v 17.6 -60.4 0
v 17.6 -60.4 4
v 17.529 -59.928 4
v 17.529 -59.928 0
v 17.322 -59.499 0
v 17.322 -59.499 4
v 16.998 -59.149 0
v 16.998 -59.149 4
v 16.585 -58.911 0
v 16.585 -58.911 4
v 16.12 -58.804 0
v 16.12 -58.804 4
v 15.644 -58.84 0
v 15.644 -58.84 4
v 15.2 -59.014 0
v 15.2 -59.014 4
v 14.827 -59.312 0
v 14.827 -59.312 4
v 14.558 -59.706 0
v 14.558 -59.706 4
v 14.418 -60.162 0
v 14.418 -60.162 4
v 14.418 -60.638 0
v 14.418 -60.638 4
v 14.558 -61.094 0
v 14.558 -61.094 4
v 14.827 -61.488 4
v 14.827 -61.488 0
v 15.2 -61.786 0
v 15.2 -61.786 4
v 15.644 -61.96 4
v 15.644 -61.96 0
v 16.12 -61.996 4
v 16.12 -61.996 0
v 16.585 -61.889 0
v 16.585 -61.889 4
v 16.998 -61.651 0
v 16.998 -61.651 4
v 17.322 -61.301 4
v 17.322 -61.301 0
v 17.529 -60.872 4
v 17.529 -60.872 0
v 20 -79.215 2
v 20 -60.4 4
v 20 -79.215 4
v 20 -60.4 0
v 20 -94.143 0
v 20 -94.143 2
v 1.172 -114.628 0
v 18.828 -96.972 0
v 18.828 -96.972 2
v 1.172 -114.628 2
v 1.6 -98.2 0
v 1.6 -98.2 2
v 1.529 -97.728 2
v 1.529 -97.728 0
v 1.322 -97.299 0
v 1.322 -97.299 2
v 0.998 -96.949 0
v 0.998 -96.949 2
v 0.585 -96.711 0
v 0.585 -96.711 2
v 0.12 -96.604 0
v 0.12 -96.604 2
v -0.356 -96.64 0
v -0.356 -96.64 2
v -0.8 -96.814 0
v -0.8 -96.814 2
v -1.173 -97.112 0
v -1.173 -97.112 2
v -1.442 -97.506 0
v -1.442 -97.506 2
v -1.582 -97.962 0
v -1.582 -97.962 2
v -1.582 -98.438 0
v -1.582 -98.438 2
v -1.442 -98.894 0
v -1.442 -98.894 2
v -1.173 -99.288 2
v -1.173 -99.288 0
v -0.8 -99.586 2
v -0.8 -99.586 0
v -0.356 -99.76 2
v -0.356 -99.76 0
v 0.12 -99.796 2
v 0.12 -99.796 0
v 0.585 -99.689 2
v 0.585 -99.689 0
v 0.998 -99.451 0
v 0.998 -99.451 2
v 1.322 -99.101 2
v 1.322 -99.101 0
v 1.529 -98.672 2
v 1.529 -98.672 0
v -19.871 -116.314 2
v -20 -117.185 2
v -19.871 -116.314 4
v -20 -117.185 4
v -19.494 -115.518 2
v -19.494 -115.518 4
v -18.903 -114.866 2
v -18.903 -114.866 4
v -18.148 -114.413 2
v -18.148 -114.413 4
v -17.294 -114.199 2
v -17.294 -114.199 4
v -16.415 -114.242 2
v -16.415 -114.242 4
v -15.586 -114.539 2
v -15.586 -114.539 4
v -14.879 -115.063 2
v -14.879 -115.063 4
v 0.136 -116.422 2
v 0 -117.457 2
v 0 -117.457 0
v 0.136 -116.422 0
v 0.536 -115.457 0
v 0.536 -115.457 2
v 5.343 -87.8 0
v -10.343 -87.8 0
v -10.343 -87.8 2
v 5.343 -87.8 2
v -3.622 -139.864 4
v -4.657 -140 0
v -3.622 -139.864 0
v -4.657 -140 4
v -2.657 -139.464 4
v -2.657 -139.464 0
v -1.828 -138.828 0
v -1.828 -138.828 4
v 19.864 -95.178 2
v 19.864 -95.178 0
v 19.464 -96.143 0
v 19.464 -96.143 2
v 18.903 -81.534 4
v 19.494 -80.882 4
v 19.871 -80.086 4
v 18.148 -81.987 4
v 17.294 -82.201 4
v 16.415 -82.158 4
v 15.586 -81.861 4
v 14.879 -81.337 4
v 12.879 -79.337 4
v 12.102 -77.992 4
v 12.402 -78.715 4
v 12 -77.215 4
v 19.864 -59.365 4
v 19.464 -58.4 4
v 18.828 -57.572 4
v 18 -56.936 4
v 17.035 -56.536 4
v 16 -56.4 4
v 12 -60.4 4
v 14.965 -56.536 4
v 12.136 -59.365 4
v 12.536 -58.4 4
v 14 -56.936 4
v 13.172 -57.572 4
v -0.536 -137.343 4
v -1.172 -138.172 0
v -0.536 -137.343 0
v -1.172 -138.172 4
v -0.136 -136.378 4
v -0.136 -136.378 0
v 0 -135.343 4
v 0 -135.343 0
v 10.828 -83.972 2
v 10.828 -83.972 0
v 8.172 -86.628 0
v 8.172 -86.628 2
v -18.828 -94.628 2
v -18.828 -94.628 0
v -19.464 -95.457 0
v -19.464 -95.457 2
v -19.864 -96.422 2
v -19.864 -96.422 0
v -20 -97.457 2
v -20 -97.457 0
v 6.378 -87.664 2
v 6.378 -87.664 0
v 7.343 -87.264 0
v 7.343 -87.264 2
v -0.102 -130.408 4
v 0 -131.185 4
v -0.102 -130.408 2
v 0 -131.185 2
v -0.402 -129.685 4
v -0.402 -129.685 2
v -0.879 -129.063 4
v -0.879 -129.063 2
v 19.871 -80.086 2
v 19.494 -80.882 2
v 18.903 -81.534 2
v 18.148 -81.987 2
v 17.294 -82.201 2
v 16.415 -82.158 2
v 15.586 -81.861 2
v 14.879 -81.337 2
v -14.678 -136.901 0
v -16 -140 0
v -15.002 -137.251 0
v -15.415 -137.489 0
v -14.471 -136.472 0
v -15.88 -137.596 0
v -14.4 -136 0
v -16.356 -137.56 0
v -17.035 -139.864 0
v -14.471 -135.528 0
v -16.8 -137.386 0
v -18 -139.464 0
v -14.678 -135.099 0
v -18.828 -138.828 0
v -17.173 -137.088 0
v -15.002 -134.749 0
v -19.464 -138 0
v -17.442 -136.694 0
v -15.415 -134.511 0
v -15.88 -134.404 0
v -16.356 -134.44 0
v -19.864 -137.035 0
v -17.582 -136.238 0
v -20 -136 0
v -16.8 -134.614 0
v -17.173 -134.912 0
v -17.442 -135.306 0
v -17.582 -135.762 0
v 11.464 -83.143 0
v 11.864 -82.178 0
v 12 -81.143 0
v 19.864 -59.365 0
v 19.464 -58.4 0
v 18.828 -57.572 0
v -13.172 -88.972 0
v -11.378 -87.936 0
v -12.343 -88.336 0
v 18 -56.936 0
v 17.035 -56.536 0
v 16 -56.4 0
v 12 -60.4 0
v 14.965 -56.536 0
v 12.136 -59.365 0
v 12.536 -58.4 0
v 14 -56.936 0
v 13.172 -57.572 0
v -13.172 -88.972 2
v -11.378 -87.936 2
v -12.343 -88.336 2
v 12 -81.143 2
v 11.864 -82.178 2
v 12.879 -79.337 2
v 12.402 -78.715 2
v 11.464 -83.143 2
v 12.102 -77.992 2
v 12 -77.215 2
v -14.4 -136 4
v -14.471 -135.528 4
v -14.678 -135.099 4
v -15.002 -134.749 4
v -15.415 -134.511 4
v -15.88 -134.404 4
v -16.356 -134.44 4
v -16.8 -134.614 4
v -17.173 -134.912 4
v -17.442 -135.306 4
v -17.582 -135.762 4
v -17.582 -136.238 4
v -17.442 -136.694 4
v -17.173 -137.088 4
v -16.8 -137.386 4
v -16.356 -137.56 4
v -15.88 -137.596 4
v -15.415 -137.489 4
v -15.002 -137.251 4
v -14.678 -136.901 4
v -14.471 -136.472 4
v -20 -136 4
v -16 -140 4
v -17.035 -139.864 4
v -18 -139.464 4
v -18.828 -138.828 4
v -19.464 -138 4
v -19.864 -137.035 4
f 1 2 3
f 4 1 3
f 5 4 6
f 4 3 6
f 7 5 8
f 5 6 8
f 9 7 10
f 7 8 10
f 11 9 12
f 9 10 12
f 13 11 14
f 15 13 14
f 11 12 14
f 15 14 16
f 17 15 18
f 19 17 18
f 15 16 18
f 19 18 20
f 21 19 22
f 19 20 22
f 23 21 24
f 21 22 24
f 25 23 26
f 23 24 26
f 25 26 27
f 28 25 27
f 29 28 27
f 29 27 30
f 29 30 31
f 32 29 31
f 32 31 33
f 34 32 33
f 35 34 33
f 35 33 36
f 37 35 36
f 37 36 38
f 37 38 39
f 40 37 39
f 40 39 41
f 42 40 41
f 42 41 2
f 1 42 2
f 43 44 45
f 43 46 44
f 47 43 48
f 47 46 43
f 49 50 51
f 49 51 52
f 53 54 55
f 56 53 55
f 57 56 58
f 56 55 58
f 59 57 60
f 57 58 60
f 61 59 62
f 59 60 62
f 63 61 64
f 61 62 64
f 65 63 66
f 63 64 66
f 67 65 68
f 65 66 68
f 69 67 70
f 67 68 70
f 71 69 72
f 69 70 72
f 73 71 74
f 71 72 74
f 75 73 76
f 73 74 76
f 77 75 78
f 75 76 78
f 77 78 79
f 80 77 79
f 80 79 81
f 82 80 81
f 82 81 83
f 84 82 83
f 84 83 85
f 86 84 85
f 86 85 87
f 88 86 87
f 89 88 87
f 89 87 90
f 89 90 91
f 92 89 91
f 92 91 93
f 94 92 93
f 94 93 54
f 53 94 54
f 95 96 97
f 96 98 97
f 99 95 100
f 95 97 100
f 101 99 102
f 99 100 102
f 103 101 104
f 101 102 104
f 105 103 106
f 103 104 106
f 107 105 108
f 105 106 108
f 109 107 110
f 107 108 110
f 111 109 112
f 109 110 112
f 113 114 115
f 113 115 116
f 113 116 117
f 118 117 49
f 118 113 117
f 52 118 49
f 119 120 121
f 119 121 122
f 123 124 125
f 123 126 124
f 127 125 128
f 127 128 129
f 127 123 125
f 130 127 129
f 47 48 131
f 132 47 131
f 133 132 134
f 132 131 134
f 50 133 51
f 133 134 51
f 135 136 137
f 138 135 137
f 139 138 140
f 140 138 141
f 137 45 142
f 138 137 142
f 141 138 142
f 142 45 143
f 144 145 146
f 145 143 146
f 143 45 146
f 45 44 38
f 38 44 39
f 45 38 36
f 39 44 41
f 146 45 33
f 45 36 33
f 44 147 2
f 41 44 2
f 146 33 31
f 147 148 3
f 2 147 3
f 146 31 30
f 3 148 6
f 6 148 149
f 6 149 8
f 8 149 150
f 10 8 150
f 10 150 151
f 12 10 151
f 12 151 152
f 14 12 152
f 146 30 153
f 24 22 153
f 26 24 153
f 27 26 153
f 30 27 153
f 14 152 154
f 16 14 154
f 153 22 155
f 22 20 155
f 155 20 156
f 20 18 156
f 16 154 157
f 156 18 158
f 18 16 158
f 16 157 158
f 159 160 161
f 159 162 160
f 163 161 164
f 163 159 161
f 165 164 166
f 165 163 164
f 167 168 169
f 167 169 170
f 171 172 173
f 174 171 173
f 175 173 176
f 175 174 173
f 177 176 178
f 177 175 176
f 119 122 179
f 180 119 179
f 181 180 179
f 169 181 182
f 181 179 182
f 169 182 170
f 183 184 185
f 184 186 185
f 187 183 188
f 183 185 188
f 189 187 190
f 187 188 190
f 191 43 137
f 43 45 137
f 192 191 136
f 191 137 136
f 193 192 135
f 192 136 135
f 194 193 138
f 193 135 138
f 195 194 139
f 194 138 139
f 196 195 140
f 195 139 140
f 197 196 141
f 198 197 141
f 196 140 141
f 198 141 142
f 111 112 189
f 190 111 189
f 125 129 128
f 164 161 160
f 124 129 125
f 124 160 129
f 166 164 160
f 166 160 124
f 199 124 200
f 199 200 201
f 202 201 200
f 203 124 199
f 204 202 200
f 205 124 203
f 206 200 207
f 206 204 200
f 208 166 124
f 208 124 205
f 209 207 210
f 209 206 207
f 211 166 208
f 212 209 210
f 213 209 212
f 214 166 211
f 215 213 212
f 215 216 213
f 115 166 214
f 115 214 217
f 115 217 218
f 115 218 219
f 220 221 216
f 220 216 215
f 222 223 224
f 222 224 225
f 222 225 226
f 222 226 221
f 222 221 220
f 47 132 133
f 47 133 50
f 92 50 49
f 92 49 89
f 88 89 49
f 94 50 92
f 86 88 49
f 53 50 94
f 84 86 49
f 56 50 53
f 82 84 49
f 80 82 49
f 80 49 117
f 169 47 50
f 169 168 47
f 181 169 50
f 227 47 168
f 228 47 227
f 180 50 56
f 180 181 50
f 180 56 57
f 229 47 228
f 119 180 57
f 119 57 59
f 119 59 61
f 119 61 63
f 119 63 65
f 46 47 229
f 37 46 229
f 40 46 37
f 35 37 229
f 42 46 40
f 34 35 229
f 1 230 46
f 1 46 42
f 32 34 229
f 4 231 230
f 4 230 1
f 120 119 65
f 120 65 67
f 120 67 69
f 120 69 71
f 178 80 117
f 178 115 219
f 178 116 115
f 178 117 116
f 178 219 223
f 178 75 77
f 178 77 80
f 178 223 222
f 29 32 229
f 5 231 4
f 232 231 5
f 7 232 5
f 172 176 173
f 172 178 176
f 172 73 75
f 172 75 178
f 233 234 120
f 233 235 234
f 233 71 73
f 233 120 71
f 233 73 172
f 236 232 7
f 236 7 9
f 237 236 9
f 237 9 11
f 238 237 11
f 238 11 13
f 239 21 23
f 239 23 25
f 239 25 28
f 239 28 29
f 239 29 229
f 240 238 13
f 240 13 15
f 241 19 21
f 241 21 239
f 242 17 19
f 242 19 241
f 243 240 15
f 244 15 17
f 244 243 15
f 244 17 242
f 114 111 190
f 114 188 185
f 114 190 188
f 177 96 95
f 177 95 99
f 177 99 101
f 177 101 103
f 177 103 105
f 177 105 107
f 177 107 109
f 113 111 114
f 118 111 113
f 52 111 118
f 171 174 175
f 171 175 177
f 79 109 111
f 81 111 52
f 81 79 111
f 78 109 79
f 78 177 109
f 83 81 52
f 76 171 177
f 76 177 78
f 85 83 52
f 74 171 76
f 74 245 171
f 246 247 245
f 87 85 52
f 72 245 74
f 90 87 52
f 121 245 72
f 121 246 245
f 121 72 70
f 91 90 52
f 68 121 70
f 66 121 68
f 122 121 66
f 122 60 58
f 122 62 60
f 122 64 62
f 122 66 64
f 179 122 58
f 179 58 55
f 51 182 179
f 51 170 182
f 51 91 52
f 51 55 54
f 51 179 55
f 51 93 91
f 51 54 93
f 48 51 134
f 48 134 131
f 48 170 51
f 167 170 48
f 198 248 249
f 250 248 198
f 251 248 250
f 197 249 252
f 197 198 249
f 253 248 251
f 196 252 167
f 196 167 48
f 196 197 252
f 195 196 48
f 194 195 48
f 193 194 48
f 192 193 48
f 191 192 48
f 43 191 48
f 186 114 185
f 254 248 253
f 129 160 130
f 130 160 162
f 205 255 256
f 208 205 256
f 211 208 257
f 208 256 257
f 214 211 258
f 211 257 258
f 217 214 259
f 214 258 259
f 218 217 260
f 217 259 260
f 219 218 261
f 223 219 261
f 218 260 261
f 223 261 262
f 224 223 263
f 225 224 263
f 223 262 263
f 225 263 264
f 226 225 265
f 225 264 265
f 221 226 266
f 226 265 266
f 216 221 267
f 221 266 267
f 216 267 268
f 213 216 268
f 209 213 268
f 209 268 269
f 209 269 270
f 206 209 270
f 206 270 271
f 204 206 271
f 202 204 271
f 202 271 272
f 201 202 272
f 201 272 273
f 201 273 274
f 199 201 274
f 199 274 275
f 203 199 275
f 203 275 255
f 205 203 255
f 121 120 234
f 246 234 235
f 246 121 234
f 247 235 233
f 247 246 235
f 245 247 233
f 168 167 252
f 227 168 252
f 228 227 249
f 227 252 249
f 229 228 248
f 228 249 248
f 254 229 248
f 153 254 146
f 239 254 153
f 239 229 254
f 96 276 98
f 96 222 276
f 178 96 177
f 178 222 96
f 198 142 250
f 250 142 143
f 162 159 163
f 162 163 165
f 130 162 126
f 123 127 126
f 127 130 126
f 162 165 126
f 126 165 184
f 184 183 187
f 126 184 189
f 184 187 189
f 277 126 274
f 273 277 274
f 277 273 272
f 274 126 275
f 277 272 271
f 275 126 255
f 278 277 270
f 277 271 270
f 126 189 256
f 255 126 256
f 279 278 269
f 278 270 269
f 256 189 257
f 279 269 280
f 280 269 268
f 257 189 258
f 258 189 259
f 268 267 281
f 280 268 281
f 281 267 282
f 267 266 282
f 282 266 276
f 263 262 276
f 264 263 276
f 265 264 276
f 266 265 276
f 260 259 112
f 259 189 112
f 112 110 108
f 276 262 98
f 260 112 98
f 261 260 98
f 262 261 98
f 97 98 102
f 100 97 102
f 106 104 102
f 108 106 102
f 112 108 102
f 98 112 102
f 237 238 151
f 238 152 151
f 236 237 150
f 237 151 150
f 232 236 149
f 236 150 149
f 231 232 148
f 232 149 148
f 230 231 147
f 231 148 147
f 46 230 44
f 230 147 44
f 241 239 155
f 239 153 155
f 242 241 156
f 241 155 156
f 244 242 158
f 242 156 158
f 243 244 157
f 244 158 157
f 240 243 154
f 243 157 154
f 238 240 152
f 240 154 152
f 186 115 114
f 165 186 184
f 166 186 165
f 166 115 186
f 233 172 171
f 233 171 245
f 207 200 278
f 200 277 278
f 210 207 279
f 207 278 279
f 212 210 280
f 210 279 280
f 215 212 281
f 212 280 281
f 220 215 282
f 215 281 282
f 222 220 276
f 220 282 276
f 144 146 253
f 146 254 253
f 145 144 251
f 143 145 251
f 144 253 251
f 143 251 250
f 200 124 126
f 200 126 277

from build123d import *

# Parameters (mm, degrees)
BOSS_EXTRUDE1_DEPTH = 4
FILLET1_R           = 4
CHAMFER1_SIZE       = 3
CHAMFER2_SIZE       = 5
FILLET2_R           = 4
SKETCH2_R           = 1.6
CUT_EXTRUDE1_DEPTH  = 142.477913471
CUT_EXTRUDE2_DEPTH  = 2
FILLET3_R           = 3
SKETCH4_R           = 1.6
CUT_EXTRUDE3_DEPTH  = 142.477913471


with BuildPart() as part:
    # Sketch1 → Boss-Extrude1 (new body)
    with BuildSketch(Plane.XY):
        Polygon((-12, -87.8), (12, -87.8), (12, -56.4), (20, -56.4), (20, -95.8), (0, -115.8), (0, -140), (-20, -140), (-20, -95.8), align=None)
    extrude(amount=BOSS_EXTRUDE1_DEPTH)

    # Fillet1
    fillet1_edges = [part.edges().sort_by_distance(p)[0] for p in [
        (12, -56.4, 2),
        (20, -56.4, 2),
        (-20, -140, 2),
    ]]
    fillet(fillet1_edges, radius=FILLET1_R - 0.0001)  # a hair under: the kernel refuses the full size

    # Chamfer1
    chamfer1_edges = [part.edges().sort_by_distance(p)[0] for p in [
        (0, -140, 2),
    ]]
    chamfer(chamfer1_edges, length=CHAMFER1_SIZE)

    # Chamfer2
    chamfer2_edges = [part.edges().sort_by_distance(p)[0] for p in [
        (12, -87.8, 2),
    ]]
    chamfer(chamfer2_edges, length=CHAMFER2_SIZE)

    # Fillet2
    fillet2_edges = [part.edges().sort_by_distance(p)[0] for p in [
        (0, -115.8, 2),
        (20, -95.8, 2),
        (-12, -87.8, 2),
        (-20, -95.8, 2),
        (0, -137, 2),
        (-3, -140, 2),
        (7, -87.8, 2),
        (12, -82.8, 2),
    ]]
    fillet(fillet2_edges, radius=FILLET2_R)

    # Sketch2 → Cut-Extrude1 (cut, through all)
    with BuildSketch(Plane.XY.offset(4)):
        with Locations((0, -98.2)):
            Circle(SKETCH2_R)
    extrude(amount=-CUT_EXTRUDE1_DEPTH, mode=Mode.SUBTRACT)

    # Sketch3 → Cut-Extrude2 (cut)
    with BuildSketch(Plane.XY.offset(4)):
        Polygon((0, -129.942135624), (31.742135624, -98.2), (0, -66.457864376), (-31.742135624, -98.2), align=None)
    extrude(amount=-CUT_EXTRUDE2_DEPTH, mode=Mode.SUBTRACT)

    # Fillet3
    fillet3_edges = [part.edges().sort_by_distance(p)[0] for p in [
        (-20, -109.942135624, 3),
        (20, -86.457864376, 3),
        (12, -78.457864376, 3),
        (0, -129.942135624, 3),
    ]]
    fillet(fillet3_edges, radius=FILLET3_R)

    # Sketch4 → Cut-Extrude3 (cut, through all)
    with BuildSketch(Plane.XY.offset(4)):
        with Locations((-16, -136)):
            Circle(SKETCH4_R)
        with Locations((16, -60.4)):
            Circle(SKETCH4_R)
    extrude(amount=-CUT_EXTRUDE3_DEPTH, mode=Mode.SUBTRACT)


solid = part.part
